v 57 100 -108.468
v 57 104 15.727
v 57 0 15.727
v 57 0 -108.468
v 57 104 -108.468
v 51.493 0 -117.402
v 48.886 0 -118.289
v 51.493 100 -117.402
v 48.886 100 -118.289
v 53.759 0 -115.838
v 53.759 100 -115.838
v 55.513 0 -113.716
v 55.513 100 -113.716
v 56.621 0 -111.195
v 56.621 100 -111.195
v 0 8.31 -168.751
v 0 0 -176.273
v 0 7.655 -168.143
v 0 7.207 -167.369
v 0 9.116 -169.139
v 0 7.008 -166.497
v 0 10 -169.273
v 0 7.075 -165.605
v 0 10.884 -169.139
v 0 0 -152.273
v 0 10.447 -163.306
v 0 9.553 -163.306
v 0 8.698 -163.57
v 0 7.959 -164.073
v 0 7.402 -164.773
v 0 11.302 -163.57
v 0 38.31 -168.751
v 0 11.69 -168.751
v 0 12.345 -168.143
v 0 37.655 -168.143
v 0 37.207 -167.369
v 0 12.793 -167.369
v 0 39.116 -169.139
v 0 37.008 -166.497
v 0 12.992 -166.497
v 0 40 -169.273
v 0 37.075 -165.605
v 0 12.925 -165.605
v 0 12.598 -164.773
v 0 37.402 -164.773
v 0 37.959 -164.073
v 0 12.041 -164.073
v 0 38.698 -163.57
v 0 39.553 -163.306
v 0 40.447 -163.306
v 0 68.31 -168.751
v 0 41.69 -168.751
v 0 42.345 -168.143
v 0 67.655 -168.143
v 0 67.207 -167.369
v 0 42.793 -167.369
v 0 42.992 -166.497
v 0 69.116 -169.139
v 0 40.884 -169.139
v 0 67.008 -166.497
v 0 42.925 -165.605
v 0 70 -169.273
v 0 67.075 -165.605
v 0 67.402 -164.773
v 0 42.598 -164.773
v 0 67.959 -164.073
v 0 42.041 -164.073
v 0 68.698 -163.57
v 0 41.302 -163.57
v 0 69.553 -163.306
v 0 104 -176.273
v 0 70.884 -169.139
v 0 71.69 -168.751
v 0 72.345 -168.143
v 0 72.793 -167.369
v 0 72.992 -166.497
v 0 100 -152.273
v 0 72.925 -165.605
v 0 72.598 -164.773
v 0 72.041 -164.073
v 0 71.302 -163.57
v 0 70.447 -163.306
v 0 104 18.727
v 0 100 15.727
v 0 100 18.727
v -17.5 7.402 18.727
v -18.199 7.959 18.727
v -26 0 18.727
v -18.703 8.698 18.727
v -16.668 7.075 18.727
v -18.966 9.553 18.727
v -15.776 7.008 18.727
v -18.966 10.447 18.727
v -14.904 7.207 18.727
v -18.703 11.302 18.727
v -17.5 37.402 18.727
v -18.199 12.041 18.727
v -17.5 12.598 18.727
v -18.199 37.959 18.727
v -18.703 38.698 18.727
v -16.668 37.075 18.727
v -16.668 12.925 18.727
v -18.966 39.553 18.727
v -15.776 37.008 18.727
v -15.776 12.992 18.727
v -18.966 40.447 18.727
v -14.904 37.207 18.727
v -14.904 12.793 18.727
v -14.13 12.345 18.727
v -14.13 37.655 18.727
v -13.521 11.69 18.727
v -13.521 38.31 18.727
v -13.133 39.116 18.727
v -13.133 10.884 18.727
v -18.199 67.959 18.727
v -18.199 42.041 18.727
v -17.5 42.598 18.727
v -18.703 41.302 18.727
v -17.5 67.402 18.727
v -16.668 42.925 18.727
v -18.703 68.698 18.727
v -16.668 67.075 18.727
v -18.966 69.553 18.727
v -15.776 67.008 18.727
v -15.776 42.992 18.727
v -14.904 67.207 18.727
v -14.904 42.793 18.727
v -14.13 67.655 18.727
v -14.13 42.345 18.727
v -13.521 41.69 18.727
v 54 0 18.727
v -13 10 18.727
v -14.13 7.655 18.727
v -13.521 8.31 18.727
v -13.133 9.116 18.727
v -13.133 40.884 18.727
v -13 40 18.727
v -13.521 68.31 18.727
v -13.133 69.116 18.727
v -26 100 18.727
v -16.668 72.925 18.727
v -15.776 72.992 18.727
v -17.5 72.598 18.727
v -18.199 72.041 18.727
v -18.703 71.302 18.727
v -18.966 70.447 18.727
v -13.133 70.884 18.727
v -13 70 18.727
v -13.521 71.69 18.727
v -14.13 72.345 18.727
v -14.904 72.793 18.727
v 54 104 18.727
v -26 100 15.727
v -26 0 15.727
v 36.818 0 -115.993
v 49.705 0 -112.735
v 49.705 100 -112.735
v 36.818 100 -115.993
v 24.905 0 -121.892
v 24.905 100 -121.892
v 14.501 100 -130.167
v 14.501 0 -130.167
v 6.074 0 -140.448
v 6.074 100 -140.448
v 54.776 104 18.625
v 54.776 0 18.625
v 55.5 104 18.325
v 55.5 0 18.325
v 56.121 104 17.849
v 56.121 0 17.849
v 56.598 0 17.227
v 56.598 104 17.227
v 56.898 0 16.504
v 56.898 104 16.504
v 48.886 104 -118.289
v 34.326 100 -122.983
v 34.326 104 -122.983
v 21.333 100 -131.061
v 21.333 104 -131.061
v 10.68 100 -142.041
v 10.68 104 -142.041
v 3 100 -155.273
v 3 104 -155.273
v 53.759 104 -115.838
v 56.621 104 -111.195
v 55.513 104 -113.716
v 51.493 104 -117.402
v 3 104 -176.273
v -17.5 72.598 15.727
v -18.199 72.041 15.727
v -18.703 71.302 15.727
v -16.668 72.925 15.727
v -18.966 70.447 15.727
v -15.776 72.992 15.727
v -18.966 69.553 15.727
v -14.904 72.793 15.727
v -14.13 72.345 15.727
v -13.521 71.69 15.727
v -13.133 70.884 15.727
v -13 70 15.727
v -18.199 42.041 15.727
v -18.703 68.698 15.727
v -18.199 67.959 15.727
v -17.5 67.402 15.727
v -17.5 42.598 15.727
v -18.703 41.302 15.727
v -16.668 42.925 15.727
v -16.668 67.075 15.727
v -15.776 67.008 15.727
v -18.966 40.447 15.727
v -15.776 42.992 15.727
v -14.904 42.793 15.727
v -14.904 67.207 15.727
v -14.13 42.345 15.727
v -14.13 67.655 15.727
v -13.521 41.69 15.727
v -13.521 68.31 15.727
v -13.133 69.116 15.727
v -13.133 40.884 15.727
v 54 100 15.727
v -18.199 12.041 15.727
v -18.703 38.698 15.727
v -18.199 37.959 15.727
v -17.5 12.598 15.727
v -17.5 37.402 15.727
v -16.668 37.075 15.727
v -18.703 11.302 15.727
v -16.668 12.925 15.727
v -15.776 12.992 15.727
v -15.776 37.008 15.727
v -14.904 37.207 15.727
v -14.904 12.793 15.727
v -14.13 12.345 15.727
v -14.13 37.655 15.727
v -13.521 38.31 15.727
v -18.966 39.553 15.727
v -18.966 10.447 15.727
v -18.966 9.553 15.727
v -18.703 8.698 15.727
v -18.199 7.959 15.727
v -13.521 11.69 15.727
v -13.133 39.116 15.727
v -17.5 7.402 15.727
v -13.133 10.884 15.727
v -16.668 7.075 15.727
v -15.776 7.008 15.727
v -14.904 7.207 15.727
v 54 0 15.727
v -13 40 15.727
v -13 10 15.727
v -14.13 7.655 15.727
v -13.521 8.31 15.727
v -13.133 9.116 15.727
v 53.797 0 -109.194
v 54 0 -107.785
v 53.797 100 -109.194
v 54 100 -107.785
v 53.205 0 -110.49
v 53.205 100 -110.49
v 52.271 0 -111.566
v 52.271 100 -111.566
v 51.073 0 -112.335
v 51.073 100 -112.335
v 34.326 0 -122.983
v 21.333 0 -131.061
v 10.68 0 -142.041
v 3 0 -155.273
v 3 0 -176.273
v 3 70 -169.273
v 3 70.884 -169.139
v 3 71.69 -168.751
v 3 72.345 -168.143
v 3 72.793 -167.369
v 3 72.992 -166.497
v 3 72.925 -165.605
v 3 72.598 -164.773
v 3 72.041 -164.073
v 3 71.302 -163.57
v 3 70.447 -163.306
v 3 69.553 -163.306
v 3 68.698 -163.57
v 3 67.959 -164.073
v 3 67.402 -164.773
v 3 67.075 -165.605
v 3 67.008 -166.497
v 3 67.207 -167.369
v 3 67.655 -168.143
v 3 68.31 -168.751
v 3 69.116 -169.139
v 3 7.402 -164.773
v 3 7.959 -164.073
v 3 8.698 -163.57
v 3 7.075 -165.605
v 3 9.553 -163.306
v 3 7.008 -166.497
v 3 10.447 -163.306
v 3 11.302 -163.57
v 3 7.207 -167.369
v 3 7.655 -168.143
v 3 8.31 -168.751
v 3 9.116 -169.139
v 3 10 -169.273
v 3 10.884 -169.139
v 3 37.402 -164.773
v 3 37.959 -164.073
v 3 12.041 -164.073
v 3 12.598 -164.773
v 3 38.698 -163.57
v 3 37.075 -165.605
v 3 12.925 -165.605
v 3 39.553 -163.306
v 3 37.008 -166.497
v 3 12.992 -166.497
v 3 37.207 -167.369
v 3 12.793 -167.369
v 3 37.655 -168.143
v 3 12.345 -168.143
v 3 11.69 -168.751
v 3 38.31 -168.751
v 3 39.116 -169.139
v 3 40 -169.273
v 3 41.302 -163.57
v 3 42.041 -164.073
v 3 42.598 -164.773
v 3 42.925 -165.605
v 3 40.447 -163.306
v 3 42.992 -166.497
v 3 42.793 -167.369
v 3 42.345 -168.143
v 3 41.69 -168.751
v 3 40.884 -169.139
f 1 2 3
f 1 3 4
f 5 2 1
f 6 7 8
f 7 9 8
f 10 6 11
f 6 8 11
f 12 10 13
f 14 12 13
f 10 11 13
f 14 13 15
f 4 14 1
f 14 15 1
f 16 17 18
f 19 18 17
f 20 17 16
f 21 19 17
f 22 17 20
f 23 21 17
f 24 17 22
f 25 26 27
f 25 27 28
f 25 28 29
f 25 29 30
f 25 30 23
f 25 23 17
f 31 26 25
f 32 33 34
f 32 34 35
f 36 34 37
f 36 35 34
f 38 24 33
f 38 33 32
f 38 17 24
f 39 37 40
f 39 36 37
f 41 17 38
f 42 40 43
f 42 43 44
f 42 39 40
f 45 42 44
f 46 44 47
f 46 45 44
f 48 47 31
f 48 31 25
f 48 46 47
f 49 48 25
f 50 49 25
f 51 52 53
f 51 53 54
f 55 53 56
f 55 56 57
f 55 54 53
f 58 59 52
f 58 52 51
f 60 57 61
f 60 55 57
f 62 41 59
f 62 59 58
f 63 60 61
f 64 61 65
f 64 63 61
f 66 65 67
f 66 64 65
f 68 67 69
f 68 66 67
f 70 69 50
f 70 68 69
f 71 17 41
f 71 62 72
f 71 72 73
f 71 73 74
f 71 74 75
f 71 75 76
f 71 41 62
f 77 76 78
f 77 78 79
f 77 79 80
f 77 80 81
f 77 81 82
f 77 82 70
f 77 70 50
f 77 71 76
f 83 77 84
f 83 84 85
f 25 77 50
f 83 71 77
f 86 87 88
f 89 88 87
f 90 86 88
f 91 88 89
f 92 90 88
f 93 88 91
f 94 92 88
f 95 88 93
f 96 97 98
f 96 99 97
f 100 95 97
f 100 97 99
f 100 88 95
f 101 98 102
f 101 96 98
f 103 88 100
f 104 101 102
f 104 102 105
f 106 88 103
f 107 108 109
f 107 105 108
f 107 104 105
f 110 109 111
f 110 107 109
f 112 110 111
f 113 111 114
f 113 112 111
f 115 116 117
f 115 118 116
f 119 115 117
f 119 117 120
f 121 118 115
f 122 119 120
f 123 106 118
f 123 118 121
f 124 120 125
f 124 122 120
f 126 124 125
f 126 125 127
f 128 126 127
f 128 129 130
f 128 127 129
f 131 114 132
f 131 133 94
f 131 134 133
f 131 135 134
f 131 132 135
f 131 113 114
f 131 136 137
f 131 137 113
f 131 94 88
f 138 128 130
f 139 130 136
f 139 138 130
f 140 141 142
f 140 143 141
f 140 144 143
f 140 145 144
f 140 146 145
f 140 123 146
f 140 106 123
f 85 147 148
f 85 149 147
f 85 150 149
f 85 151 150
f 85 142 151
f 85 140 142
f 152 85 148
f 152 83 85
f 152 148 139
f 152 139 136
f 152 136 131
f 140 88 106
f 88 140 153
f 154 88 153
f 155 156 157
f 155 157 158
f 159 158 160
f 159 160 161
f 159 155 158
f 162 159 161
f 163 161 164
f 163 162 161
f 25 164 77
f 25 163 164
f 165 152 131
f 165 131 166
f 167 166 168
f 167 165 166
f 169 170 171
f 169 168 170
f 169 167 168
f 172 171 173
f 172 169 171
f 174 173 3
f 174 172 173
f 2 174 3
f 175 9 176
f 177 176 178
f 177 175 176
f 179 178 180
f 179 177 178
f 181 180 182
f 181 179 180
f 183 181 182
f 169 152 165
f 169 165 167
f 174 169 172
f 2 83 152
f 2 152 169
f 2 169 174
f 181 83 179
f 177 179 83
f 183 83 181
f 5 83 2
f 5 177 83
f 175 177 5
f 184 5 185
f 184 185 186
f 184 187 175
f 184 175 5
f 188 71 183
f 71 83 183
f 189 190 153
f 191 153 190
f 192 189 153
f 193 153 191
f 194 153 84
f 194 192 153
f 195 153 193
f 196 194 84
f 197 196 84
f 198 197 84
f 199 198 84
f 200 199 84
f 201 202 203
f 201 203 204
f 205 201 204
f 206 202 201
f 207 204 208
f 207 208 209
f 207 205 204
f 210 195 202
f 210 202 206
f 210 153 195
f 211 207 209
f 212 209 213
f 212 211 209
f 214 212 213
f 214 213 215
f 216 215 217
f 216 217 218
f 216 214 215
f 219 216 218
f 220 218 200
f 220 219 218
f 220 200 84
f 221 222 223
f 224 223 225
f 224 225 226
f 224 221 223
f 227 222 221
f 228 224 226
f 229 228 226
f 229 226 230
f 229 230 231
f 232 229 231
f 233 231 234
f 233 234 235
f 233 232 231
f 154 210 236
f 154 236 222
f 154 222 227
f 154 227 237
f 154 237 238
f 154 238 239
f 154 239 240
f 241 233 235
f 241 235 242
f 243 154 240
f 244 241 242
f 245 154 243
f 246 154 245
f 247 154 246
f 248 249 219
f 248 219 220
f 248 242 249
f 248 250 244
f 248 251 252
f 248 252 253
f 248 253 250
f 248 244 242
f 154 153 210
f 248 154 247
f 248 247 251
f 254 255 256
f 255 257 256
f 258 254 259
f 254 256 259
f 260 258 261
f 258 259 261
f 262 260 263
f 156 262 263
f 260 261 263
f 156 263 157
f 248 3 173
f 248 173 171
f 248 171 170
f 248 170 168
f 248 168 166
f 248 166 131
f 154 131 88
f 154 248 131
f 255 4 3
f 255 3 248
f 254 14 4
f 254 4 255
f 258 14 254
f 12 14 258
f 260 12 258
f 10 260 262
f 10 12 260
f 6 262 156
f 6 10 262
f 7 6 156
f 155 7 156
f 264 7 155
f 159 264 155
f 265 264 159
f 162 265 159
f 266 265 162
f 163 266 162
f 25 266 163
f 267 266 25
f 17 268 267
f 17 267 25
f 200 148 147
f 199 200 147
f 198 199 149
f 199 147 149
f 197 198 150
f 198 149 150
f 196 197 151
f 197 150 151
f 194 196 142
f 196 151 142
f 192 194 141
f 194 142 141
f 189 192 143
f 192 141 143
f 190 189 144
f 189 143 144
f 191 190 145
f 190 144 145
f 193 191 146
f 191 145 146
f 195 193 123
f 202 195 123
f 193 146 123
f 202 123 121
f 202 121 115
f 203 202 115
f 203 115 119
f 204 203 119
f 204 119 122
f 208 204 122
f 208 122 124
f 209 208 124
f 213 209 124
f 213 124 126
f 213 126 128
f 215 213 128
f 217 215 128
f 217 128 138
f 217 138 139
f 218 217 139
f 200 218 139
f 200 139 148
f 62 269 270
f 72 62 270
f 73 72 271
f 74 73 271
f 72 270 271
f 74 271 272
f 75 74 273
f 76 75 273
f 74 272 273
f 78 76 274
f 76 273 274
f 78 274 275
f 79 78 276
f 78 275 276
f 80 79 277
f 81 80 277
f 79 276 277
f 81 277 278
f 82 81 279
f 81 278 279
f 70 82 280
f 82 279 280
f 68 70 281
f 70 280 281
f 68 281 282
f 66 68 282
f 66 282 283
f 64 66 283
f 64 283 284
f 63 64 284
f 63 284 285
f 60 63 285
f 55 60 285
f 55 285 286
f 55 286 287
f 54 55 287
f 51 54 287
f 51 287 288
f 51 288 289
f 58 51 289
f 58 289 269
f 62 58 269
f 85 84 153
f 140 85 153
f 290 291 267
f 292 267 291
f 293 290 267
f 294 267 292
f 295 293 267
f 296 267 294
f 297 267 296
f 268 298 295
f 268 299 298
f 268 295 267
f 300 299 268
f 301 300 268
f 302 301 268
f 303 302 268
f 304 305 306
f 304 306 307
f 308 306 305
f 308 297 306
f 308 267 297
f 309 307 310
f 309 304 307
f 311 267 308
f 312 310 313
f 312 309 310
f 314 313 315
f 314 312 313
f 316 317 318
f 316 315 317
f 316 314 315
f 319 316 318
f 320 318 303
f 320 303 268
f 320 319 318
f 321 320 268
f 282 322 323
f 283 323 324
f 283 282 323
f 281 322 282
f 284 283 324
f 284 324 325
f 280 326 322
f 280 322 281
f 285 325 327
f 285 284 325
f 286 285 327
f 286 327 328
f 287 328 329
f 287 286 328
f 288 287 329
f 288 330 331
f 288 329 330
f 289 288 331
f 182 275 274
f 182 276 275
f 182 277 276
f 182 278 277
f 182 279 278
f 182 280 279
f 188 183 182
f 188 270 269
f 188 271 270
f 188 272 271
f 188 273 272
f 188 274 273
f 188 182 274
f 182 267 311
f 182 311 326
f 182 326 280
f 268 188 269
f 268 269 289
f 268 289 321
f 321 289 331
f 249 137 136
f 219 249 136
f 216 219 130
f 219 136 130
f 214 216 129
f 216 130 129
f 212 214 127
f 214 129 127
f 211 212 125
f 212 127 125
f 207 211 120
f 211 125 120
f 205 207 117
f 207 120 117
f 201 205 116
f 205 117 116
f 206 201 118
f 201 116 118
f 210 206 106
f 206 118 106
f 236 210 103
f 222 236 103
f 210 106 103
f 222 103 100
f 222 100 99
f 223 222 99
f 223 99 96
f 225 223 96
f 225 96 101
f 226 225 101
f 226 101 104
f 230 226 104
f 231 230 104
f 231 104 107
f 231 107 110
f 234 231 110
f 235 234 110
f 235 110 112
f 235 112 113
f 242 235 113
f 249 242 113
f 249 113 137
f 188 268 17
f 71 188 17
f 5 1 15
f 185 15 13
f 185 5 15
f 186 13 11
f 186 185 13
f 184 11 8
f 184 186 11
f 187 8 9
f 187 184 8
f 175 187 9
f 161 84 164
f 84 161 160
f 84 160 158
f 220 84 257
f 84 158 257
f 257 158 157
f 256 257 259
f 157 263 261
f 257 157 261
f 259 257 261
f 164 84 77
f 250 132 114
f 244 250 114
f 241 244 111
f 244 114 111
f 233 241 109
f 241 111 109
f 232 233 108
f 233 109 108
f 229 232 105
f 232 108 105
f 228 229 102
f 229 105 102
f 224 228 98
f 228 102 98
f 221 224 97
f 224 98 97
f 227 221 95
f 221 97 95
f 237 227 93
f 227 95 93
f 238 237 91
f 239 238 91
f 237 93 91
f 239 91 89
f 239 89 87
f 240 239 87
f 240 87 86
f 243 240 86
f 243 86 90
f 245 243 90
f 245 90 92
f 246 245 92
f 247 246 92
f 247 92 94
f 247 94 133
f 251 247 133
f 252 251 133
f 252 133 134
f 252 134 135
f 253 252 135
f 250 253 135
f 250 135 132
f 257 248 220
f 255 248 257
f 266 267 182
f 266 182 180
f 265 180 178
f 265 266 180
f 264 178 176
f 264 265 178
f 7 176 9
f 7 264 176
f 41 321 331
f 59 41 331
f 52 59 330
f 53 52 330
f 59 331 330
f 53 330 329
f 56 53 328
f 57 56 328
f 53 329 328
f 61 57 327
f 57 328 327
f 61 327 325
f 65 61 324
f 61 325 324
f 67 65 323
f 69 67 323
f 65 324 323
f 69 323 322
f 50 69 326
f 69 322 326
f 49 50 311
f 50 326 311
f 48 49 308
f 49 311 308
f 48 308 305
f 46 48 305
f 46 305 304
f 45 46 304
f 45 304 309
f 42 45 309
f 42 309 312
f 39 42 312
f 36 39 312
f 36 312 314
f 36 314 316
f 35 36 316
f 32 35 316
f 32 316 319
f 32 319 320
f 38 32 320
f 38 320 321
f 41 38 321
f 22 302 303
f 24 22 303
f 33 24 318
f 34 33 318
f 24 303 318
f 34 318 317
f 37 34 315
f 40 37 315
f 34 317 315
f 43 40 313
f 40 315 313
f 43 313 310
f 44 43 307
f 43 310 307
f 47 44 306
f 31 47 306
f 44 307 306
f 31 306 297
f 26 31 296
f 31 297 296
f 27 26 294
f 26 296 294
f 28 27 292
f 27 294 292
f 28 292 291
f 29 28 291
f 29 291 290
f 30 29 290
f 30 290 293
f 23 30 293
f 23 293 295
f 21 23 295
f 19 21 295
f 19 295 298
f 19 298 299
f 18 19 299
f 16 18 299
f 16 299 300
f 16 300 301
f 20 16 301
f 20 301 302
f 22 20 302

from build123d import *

# Parameters (mm, degrees)
EXTRUDE_1_DEPTH     = 100
FILLET_1_R          = 10
FILLET_2_R          = 3
SKETCH_2_R          = 3
CUT_EXTRUDE_1_DEPTH = 60
SKETCH_3_R          = 3
CUT_EXTRUDE_2_DEPTH = 60
FILLET_3_R          = 5
EXTRUDE_START       = 4
EXTRUDE_2_DEPTH     = 4


with BuildPart() as part:
    # Эскиз1 → Бобышка-Вытянуть1 (new body)
    with BuildSketch(Plane(origin=(0, 0, 0), x_dir=(1, 0, 0), z_dir=(0, 1, 0))):
        with BuildLine():
            Line((0, 152.272615506), (0, 176.272615506))
            Line((0, 176.272615506), (3, 176.272615506))
            Line((3, 176.272615506), (3, 155.272615506))
            ThreePointArc((3, 155.272615506), (24.600029492, 128.598973205), (57, 117.272615506))
            Line((57, 117.272615506), (57, -18.727384494))
            Line((57, -18.727384494), (-26, -18.727384494))
            Line((-26, -18.727384494), (-26, -15.727384494))
            Line((-26, -15.727384494), (54, -15.727384494))
            Line((54, -15.727384494), (54, 112.272615506))
            ThreePointArc((54, 112.272615506), (21.19671601, 124.438182118), (0, 152.272615506))
        make_face()
    extrude(amount=EXTRUDE_1_DEPTH)

    # Скругление1
    fillet_1_edges = [part.edges().sort_by_distance(p)[0] for p in [
        (57, 50, -117.272615506),
    ]]
    fillet(fillet_1_edges, radius=FILLET_1_R)

    # Скругление2
    fillet_2_edges = [part.edges().sort_by_distance(p)[0] for p in [
        (57, 50, 18.727384494),
    ]]
    fillet(fillet_2_edges, radius=FILLET_2_R)

    # Эскиз2 → Вырез-Вытянуть1 (cut)
    with BuildSketch(Plane.XY.offset(18.727384494)):
        with Locations((-16, 70)):
            Circle(SKETCH_2_R)
        with Locations((-16, 40)):
            Circle(SKETCH_2_R)
        with Locations((-16, 10)):
            Circle(SKETCH_2_R)
    extrude(amount=-CUT_EXTRUDE_1_DEPTH, mode=Mode.SUBTRACT)

    # Эскиз3 → Вырез-Вытянуть2 (cut)
    with BuildSketch(Plane(origin=(3, 0, 0), x_dir=(0, 0, -1), z_dir=(1, 0, 0))):
        with Locations((166.272615506, 10)):
            Circle(SKETCH_3_R)
        with Locations((166.272615506, 40)):
            Circle(SKETCH_3_R)
        with Locations((166.272615506, 70)):
            Circle(SKETCH_3_R)
    extrude(amount=-CUT_EXTRUDE_2_DEPTH, mode=Mode.SUBTRACT)

    # Скругление3
    fillet_3_edges = [part.edges().sort_by_distance(p)[0] for p in [
        (54, 50, -112.272615506),
    ]]
    fillet(fillet_3_edges, radius=FILLET_3_R)

    # Эскиз4 → Бобышка-Вытянуть2 (add)
    with BuildSketch(Plane(origin=(0, 100, 0), x_dir=(1, 0, 0), z_dir=(0, 1, 0)).offset(EXTRUDE_START)):
        with BuildLine():
            Line((3, 176.272615506), (0, 176.272615506))
            Line((0, 176.272615506), (0, -18.727384494))
            Line((0, -18.727384494), (54, -18.727384494))
            ThreePointArc((54, -18.727384494), (56.121320344, -17.848704838), (57, -15.727384494))
            Line((57, -15.727384494), (57, 108.468113504))
            ThreePointArc((57, 108.468113504), (54.709126709, 114.837522062), (48.886126924, 118.288629031))
            ThreePointArc((48.886126924, 118.288629031), (21.33303931, 131.060953474), (3, 155.272615506))
            Line((3, 155.272615506), (3, 176.272615506))
        make_face()
    extrude(amount=-EXTRUDE_2_DEPTH)


solid = part.part
